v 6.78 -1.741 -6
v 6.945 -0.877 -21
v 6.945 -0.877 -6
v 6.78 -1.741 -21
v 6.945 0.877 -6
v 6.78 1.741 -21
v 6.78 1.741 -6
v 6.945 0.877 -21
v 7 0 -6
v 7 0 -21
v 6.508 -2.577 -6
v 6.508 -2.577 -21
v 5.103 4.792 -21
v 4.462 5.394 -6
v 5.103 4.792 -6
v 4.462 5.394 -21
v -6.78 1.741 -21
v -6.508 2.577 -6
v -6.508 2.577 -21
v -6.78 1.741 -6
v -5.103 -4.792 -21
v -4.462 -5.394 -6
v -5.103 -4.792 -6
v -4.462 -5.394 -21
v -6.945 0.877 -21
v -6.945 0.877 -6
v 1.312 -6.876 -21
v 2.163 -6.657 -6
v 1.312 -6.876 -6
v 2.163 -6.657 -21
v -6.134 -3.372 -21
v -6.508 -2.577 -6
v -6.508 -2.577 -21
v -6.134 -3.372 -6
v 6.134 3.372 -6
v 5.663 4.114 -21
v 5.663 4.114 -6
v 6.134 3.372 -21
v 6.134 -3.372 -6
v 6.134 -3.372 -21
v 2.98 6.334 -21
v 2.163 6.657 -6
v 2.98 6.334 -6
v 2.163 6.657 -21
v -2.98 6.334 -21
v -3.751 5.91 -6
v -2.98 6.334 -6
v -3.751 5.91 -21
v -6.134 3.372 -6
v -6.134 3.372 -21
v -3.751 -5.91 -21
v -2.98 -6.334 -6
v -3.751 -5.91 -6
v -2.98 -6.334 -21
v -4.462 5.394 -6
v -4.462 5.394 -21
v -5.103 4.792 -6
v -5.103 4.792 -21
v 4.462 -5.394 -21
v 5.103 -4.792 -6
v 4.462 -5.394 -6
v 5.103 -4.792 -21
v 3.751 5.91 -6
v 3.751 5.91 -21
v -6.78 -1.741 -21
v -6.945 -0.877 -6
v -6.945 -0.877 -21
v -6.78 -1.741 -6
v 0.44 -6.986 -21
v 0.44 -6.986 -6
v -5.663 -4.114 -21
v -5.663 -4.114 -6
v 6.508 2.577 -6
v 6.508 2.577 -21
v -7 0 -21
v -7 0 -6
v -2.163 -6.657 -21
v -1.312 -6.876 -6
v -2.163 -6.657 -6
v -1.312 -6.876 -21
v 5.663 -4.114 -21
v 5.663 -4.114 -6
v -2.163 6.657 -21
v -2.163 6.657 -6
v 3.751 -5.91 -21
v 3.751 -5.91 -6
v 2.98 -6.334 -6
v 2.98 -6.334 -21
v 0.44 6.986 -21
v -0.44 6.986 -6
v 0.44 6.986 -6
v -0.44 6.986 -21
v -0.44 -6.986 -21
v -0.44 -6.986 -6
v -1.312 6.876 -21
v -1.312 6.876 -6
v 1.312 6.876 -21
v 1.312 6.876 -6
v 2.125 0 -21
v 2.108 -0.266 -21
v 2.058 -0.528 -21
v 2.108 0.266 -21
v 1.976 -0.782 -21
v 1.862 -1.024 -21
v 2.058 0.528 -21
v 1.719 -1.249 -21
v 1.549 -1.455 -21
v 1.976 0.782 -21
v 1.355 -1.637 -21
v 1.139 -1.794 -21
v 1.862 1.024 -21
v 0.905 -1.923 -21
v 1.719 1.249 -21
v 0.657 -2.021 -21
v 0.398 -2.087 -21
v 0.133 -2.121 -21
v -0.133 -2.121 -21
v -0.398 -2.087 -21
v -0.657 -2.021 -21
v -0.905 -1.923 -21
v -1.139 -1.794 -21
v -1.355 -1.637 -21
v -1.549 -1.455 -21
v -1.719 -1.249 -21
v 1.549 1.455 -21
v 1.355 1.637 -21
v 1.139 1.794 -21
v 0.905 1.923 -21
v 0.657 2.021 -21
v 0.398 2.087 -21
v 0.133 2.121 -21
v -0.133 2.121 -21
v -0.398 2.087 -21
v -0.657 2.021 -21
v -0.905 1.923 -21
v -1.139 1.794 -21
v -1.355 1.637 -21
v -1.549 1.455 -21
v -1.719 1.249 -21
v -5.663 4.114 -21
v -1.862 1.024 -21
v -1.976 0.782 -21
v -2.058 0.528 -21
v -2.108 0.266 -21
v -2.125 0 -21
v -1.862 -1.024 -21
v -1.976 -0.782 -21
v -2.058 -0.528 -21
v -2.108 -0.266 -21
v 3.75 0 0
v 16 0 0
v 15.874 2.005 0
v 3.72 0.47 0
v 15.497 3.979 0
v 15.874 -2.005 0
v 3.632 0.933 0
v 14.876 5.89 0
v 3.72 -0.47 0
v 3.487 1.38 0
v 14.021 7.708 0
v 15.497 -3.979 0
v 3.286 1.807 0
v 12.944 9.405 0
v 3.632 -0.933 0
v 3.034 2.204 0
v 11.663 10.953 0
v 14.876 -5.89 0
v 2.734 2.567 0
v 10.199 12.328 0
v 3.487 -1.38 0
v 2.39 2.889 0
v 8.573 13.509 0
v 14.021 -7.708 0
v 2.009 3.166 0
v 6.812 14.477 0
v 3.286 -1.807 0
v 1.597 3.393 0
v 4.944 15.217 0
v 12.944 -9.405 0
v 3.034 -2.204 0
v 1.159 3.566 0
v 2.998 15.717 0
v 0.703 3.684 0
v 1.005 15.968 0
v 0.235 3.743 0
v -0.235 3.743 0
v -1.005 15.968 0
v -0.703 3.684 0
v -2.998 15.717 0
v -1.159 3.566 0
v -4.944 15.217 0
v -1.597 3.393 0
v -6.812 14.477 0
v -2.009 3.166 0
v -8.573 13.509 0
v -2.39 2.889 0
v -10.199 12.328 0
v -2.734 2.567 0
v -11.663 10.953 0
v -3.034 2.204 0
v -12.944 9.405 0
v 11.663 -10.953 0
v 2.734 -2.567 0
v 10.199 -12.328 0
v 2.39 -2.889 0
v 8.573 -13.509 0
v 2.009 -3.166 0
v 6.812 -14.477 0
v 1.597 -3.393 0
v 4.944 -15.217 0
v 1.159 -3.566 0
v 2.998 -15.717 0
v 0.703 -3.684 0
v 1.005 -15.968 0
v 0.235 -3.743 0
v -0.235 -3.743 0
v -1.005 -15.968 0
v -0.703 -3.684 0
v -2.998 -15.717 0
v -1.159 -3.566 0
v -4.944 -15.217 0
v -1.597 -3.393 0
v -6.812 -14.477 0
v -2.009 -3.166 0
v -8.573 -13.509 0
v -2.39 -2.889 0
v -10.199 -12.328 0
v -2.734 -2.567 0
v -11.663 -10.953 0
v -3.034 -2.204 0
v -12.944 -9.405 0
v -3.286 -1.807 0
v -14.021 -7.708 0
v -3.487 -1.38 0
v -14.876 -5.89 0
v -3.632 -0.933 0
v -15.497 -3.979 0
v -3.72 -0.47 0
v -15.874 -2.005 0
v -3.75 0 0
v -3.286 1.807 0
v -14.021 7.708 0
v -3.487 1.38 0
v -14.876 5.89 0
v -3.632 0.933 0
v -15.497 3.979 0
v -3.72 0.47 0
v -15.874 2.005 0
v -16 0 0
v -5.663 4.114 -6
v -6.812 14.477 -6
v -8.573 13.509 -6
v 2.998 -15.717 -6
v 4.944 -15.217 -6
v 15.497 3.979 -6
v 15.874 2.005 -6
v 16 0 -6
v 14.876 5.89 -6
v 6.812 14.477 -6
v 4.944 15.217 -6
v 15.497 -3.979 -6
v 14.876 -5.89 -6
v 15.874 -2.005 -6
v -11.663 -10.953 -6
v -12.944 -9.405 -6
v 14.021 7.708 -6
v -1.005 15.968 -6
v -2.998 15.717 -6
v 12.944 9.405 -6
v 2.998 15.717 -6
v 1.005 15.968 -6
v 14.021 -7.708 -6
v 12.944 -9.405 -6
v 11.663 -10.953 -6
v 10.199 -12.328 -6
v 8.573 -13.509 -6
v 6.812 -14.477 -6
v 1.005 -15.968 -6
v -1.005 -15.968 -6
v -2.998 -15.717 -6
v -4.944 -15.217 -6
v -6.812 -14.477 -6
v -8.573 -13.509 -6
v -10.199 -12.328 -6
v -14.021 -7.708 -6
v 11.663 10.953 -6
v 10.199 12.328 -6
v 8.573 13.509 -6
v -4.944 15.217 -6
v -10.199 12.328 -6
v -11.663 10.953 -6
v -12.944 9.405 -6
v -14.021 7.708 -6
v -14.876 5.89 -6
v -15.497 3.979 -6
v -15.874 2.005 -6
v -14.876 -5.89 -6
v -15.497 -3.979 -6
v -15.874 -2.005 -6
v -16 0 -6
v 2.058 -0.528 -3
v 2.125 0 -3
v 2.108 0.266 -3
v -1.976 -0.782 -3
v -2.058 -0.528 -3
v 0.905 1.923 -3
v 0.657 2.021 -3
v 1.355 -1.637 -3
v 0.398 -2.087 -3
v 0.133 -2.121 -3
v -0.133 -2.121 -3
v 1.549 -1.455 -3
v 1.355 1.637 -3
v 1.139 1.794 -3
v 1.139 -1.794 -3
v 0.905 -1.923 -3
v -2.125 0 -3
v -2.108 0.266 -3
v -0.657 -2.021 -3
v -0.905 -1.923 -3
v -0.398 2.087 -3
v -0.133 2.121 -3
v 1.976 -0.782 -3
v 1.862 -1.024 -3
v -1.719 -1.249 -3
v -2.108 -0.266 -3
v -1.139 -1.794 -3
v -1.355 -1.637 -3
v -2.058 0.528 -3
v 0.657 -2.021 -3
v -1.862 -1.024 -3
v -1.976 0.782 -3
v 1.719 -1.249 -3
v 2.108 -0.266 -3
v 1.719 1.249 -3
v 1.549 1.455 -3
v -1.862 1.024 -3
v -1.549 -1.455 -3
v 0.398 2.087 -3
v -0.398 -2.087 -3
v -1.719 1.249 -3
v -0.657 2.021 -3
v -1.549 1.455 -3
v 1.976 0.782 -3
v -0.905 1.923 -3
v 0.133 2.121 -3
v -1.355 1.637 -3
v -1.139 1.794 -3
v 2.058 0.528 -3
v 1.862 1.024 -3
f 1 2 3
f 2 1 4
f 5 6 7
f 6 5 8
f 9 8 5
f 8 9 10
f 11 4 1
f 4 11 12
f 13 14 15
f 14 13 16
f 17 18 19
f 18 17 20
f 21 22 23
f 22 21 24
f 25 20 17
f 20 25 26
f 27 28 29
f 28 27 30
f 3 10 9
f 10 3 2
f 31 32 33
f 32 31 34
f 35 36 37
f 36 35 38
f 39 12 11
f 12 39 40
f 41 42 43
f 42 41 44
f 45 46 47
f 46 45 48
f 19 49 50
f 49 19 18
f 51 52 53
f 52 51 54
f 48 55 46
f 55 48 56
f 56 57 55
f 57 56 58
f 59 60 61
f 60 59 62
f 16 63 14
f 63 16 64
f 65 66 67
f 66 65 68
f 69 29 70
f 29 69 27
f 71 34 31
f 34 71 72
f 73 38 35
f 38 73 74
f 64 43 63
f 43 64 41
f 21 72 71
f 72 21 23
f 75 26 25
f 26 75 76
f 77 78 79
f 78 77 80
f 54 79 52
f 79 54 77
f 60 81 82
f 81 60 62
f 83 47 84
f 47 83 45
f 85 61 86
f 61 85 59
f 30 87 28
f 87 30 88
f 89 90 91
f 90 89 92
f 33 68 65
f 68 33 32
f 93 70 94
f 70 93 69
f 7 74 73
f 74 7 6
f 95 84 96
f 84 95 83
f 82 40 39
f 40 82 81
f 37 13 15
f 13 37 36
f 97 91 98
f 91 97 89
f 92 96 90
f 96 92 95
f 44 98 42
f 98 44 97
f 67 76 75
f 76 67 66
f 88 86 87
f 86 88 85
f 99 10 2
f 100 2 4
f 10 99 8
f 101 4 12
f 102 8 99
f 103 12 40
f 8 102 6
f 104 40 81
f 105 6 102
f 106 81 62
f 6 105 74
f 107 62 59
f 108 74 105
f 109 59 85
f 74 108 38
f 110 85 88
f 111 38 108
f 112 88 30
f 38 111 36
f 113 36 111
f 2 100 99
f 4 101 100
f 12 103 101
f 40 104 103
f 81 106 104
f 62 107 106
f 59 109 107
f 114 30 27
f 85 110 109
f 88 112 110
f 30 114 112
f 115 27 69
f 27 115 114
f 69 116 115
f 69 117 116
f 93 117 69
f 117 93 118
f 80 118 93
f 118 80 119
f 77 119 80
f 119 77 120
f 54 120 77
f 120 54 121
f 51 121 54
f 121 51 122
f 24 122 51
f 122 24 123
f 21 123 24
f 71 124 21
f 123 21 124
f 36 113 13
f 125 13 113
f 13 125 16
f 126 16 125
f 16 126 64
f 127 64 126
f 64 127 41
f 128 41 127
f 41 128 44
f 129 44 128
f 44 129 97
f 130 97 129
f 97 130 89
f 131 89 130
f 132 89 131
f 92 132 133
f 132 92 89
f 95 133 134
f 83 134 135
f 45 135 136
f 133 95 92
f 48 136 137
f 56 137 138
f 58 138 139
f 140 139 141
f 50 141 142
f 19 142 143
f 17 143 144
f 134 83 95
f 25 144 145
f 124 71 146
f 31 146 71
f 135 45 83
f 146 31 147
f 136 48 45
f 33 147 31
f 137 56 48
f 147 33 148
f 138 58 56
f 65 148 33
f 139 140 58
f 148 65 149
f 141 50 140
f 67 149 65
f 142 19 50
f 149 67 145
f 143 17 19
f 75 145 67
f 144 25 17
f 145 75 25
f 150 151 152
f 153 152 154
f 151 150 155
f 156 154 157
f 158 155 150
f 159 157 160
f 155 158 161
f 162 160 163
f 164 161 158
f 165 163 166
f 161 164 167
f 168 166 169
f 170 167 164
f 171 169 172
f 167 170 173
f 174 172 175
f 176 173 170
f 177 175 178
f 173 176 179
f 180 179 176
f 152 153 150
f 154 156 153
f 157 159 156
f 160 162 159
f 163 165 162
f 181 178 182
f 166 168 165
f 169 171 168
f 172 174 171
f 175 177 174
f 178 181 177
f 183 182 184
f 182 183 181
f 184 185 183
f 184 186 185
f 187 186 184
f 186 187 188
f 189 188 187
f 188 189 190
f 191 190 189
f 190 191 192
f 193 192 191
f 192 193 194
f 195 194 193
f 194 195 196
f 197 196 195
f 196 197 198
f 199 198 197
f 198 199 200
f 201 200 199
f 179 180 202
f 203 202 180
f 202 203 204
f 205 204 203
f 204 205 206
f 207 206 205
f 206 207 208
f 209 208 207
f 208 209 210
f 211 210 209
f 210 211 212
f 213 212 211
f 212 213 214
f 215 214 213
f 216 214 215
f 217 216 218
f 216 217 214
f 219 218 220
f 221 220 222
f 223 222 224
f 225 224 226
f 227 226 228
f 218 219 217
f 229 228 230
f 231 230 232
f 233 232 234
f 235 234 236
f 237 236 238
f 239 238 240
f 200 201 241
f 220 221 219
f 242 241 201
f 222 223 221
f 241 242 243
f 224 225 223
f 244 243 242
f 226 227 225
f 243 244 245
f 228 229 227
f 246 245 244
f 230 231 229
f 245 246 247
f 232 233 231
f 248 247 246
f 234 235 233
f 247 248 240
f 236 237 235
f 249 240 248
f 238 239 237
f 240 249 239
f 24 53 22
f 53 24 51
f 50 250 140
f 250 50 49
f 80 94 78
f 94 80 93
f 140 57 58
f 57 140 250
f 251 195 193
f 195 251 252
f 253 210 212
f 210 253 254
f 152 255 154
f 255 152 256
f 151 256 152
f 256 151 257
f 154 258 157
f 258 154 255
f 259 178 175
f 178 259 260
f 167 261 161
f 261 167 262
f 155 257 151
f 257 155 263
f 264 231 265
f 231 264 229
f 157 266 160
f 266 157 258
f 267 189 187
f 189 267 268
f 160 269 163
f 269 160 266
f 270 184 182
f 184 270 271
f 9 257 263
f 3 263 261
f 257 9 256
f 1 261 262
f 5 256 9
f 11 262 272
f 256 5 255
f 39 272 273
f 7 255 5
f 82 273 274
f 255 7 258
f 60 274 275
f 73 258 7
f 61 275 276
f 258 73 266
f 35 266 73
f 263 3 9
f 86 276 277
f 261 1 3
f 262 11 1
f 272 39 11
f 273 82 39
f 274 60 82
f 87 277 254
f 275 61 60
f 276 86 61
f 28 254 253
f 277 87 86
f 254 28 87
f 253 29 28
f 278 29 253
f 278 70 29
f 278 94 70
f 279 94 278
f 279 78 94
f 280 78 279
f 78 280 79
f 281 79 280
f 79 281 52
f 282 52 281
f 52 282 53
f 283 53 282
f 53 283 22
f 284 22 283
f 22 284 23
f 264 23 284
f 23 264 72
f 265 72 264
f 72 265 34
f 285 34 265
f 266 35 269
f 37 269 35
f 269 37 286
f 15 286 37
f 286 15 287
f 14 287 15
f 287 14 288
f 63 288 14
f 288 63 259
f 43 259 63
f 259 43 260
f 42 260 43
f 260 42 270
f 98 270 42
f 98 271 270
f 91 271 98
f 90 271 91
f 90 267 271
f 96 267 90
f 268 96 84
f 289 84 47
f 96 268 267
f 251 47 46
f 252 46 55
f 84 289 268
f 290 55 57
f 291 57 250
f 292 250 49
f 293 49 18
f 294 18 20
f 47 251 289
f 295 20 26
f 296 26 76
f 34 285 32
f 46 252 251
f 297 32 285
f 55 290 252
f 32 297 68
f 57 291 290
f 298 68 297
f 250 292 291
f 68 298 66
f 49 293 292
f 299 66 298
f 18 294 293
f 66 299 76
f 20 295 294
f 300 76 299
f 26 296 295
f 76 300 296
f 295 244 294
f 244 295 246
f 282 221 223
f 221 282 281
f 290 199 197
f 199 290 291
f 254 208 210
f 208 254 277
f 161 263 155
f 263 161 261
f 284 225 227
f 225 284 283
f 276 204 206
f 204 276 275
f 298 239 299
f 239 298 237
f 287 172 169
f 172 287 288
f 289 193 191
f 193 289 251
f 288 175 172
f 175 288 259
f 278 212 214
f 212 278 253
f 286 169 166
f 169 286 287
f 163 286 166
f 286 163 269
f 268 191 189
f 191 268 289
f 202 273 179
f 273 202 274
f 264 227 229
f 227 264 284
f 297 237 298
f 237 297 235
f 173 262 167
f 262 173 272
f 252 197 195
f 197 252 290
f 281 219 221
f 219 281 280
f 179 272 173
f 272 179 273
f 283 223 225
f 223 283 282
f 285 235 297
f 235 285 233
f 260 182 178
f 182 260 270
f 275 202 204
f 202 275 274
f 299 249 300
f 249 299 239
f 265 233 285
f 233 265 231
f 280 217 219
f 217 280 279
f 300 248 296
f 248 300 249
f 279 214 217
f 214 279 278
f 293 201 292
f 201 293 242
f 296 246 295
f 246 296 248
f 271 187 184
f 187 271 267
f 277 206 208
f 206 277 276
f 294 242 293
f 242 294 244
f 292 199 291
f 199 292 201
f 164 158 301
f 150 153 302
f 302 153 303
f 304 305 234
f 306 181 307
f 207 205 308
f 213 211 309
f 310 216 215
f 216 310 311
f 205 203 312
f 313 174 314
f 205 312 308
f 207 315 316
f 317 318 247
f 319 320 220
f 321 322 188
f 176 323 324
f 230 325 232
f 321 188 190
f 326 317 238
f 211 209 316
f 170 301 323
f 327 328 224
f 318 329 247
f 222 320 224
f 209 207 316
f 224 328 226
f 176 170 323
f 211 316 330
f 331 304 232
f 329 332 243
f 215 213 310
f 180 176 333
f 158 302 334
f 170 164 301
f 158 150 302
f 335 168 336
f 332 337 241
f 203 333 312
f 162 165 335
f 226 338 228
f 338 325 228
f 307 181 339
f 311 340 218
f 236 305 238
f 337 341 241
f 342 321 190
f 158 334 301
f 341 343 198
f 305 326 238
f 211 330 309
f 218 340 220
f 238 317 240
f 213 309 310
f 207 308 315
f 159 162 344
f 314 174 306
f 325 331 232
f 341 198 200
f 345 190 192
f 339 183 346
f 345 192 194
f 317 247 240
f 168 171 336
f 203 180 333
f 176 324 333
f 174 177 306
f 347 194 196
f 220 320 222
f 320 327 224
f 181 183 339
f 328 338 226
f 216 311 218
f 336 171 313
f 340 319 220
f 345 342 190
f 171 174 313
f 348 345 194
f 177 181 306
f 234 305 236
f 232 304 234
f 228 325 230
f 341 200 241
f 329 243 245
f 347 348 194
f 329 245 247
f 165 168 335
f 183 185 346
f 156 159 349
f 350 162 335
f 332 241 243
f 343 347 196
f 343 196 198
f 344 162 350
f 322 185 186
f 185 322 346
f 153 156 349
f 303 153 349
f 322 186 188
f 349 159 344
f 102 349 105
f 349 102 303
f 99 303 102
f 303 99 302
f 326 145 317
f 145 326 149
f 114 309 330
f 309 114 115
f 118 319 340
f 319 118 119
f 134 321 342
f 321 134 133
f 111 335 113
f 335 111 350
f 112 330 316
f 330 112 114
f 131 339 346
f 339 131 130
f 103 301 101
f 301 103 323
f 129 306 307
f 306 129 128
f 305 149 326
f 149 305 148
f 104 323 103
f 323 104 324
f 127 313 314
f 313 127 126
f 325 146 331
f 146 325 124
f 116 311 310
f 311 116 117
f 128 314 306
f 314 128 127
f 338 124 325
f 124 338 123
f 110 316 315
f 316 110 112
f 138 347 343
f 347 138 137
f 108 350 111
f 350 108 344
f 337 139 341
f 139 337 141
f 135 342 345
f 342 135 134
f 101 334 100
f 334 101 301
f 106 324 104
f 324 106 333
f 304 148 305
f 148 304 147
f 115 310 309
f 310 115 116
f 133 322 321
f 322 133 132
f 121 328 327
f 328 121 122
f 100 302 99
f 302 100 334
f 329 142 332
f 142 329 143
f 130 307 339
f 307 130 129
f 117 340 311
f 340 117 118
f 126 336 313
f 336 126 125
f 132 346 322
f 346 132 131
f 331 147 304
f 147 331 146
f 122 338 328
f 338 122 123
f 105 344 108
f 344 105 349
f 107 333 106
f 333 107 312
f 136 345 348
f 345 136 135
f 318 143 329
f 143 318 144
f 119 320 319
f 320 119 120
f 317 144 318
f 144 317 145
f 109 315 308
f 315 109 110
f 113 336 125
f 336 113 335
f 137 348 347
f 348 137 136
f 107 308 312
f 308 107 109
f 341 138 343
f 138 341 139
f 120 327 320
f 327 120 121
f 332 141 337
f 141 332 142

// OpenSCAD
$fn = 50;


difference() {
	union() {
		translate(v = [0, 0, -21.0000000000]) {
			cylinder(h = 21, r = 7.0000000000);
		}
		translate(v = [0, 0, -6.0000000000]) {
			cylinder(h = 6, r = 16.0000000000);
		}
	}
	union() {
		translate(v = [0, 0, 0]) {
			rotate(a = [0, 0, 0]) {
				difference() {
					union() {
						#translate(v = [0, 0, -21.0000000000]) {
							cylinder(h = 21, r = 2.0000000000);
						}
						#translate(v = [0, 0, -3]) {
							cylinder(h = 3, r1 = 2.1250000000, r2 = 3.7500000000);
						}
						#translate(v = [0, 0, -21.0000000000]) {
							cylinder(h = 21, r = 2.1250000000);
						}
						#translate(v = [0, 0, -21.0000000000]) {
							cylinder(h = 21, r = 2.0000000000);
						}
					}
					union();
				}
			}
		}
	}
}
